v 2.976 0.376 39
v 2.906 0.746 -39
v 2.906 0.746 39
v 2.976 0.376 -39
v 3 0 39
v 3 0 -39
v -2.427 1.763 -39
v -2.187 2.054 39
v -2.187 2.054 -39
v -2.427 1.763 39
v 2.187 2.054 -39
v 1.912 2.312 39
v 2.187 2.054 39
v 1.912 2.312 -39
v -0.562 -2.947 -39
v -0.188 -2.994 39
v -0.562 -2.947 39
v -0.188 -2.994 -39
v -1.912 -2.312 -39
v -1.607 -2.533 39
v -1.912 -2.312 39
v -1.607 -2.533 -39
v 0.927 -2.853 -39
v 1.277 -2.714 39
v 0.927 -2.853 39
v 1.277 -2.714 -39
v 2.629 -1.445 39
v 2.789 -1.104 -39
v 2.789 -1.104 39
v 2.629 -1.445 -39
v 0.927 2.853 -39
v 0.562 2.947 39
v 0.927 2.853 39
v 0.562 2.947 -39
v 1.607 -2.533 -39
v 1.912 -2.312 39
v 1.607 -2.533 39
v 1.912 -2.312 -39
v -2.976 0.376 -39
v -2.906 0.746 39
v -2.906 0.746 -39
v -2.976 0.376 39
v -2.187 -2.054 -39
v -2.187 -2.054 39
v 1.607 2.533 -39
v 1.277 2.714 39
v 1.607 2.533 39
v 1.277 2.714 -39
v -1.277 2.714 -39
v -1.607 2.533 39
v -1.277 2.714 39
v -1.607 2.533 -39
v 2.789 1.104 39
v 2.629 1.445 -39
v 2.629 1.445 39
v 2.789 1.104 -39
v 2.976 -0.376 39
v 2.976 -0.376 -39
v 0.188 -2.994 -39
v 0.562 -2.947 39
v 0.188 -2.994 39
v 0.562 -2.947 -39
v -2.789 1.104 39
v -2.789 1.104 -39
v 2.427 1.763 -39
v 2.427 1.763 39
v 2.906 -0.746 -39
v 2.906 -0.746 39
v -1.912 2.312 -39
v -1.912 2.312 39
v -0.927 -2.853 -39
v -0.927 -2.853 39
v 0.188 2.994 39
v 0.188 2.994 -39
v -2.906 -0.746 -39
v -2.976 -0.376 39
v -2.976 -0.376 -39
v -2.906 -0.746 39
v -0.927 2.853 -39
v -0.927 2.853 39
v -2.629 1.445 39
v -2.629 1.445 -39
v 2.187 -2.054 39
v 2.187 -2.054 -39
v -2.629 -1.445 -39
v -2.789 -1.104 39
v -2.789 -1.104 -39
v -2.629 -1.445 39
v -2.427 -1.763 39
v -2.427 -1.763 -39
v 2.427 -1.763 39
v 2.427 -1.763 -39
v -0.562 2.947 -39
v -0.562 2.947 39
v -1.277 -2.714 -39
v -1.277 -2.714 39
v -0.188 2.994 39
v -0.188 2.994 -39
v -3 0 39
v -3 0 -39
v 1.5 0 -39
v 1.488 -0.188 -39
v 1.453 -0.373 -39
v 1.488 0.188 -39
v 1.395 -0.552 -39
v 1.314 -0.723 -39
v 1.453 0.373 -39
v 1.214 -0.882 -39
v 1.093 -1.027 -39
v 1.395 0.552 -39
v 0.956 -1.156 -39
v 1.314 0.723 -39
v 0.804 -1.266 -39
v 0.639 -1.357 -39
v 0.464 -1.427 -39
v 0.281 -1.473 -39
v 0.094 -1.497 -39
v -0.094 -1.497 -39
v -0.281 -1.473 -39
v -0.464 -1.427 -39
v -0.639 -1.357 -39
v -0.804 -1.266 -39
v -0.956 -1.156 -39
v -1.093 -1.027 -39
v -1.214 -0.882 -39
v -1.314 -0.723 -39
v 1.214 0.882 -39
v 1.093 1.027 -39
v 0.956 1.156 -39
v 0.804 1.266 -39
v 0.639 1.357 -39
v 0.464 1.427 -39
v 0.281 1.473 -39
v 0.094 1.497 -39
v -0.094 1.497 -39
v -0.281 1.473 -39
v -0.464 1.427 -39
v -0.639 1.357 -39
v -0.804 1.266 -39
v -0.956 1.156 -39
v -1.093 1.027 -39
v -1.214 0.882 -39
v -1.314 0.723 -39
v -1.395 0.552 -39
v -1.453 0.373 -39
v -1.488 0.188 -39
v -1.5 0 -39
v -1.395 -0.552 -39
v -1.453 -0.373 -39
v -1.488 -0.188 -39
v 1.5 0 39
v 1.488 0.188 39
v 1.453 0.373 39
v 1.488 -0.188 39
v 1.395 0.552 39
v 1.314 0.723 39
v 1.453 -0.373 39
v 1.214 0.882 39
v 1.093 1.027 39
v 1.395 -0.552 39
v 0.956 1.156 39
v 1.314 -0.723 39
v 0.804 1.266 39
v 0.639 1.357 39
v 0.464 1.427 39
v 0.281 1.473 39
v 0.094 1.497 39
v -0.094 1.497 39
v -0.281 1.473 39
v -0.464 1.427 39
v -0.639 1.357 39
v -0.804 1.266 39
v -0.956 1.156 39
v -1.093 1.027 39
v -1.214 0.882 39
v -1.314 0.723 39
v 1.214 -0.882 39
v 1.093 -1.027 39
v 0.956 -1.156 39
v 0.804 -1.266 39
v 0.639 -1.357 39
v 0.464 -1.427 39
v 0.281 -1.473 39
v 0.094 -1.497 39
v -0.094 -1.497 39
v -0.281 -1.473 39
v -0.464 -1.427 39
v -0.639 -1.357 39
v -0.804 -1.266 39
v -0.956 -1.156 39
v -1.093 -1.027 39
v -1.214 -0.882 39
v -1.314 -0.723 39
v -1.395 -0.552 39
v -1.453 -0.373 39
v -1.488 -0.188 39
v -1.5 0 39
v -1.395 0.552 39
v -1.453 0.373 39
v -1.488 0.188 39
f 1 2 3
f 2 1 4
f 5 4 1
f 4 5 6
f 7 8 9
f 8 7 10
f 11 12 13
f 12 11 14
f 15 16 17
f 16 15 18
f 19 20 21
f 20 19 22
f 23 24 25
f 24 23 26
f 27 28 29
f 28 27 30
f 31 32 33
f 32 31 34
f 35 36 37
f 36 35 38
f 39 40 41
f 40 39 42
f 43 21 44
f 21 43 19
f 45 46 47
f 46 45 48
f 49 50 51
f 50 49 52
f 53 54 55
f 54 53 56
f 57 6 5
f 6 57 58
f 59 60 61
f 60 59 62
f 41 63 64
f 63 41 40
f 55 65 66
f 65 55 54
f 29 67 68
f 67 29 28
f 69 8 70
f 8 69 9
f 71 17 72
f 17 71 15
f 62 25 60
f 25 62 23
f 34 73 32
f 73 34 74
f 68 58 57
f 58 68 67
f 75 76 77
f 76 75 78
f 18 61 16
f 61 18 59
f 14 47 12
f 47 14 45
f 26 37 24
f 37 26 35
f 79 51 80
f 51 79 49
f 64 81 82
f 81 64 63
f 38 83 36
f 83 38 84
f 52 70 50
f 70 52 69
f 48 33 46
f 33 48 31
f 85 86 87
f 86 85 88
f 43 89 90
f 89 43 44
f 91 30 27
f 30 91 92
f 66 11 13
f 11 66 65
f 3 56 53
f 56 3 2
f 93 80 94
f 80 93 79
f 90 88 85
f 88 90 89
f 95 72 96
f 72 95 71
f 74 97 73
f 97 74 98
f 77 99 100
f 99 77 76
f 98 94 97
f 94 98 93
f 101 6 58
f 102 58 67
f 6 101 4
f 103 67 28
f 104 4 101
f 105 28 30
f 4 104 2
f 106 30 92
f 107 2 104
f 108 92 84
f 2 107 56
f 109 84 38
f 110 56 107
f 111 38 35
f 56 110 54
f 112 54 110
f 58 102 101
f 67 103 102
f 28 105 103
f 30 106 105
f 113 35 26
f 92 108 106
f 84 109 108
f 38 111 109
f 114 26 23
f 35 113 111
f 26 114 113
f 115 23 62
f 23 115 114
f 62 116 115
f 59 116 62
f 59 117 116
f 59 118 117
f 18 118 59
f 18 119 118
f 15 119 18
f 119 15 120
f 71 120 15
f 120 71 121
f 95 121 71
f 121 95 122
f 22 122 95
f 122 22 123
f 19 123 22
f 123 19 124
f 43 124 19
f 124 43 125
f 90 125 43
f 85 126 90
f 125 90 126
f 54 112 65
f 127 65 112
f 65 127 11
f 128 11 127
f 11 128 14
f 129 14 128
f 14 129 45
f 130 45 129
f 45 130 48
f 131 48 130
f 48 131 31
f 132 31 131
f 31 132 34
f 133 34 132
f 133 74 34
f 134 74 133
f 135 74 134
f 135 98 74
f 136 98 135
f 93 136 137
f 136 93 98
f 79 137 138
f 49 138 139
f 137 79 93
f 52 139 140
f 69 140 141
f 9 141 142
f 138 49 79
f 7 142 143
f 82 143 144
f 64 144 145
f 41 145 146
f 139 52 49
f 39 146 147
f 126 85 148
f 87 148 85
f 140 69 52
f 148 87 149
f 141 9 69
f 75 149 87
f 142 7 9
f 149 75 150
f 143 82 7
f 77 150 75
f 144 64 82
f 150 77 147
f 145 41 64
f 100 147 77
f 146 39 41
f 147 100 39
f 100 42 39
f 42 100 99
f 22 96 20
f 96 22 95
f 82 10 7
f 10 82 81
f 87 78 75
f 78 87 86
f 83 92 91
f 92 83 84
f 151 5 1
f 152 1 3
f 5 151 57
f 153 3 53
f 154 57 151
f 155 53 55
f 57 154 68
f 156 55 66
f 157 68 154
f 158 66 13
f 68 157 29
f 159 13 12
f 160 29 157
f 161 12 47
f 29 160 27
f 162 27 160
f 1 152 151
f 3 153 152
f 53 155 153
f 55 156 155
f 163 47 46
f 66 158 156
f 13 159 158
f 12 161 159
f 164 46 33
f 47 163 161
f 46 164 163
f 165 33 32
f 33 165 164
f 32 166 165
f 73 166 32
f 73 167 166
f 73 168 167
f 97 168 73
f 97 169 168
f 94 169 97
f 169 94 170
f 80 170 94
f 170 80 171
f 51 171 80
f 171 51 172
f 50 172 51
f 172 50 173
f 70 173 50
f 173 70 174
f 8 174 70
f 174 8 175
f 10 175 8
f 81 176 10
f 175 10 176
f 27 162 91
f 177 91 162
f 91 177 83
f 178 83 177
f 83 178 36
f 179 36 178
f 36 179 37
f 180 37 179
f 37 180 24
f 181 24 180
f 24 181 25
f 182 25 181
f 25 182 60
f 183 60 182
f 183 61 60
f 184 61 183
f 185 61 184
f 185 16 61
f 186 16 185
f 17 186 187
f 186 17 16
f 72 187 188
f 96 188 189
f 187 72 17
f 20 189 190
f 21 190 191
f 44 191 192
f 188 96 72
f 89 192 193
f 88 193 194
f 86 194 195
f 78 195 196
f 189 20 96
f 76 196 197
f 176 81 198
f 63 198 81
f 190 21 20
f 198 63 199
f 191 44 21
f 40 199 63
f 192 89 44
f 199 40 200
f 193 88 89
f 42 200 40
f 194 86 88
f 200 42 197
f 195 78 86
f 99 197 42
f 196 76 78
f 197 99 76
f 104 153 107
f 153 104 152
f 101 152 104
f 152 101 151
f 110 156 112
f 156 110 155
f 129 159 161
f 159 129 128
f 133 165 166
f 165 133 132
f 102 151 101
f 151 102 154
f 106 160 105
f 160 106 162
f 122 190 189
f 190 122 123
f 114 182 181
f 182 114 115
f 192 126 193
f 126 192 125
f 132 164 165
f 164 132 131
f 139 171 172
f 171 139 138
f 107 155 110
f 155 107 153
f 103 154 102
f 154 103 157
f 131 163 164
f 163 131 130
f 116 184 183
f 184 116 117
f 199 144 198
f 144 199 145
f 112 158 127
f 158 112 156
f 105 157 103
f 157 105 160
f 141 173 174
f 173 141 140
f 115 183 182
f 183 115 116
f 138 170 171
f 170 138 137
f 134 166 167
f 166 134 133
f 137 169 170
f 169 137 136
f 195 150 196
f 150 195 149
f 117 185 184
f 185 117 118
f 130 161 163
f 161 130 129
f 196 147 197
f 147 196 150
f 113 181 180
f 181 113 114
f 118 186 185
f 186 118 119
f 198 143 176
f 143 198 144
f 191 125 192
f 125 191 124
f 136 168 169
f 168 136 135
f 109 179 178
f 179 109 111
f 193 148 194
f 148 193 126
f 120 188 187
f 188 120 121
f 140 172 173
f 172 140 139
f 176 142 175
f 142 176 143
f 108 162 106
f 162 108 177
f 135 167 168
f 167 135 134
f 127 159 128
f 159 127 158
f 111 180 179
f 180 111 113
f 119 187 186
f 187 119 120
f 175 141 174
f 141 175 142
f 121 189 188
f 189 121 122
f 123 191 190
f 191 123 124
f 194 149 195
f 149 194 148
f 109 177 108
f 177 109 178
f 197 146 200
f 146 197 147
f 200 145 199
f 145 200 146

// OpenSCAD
$fn = 50;


difference() {
	union() {
		translate(v = [0, 0, -39.0000000000]) {
			cylinder(h = 78, r = 3.0000000000);
		}
	}
	union() {
		translate(v = [0, 0, -100.0000000000]) {
			cylinder(h = 200, r = 1.5000000000);
		}
	}
}
